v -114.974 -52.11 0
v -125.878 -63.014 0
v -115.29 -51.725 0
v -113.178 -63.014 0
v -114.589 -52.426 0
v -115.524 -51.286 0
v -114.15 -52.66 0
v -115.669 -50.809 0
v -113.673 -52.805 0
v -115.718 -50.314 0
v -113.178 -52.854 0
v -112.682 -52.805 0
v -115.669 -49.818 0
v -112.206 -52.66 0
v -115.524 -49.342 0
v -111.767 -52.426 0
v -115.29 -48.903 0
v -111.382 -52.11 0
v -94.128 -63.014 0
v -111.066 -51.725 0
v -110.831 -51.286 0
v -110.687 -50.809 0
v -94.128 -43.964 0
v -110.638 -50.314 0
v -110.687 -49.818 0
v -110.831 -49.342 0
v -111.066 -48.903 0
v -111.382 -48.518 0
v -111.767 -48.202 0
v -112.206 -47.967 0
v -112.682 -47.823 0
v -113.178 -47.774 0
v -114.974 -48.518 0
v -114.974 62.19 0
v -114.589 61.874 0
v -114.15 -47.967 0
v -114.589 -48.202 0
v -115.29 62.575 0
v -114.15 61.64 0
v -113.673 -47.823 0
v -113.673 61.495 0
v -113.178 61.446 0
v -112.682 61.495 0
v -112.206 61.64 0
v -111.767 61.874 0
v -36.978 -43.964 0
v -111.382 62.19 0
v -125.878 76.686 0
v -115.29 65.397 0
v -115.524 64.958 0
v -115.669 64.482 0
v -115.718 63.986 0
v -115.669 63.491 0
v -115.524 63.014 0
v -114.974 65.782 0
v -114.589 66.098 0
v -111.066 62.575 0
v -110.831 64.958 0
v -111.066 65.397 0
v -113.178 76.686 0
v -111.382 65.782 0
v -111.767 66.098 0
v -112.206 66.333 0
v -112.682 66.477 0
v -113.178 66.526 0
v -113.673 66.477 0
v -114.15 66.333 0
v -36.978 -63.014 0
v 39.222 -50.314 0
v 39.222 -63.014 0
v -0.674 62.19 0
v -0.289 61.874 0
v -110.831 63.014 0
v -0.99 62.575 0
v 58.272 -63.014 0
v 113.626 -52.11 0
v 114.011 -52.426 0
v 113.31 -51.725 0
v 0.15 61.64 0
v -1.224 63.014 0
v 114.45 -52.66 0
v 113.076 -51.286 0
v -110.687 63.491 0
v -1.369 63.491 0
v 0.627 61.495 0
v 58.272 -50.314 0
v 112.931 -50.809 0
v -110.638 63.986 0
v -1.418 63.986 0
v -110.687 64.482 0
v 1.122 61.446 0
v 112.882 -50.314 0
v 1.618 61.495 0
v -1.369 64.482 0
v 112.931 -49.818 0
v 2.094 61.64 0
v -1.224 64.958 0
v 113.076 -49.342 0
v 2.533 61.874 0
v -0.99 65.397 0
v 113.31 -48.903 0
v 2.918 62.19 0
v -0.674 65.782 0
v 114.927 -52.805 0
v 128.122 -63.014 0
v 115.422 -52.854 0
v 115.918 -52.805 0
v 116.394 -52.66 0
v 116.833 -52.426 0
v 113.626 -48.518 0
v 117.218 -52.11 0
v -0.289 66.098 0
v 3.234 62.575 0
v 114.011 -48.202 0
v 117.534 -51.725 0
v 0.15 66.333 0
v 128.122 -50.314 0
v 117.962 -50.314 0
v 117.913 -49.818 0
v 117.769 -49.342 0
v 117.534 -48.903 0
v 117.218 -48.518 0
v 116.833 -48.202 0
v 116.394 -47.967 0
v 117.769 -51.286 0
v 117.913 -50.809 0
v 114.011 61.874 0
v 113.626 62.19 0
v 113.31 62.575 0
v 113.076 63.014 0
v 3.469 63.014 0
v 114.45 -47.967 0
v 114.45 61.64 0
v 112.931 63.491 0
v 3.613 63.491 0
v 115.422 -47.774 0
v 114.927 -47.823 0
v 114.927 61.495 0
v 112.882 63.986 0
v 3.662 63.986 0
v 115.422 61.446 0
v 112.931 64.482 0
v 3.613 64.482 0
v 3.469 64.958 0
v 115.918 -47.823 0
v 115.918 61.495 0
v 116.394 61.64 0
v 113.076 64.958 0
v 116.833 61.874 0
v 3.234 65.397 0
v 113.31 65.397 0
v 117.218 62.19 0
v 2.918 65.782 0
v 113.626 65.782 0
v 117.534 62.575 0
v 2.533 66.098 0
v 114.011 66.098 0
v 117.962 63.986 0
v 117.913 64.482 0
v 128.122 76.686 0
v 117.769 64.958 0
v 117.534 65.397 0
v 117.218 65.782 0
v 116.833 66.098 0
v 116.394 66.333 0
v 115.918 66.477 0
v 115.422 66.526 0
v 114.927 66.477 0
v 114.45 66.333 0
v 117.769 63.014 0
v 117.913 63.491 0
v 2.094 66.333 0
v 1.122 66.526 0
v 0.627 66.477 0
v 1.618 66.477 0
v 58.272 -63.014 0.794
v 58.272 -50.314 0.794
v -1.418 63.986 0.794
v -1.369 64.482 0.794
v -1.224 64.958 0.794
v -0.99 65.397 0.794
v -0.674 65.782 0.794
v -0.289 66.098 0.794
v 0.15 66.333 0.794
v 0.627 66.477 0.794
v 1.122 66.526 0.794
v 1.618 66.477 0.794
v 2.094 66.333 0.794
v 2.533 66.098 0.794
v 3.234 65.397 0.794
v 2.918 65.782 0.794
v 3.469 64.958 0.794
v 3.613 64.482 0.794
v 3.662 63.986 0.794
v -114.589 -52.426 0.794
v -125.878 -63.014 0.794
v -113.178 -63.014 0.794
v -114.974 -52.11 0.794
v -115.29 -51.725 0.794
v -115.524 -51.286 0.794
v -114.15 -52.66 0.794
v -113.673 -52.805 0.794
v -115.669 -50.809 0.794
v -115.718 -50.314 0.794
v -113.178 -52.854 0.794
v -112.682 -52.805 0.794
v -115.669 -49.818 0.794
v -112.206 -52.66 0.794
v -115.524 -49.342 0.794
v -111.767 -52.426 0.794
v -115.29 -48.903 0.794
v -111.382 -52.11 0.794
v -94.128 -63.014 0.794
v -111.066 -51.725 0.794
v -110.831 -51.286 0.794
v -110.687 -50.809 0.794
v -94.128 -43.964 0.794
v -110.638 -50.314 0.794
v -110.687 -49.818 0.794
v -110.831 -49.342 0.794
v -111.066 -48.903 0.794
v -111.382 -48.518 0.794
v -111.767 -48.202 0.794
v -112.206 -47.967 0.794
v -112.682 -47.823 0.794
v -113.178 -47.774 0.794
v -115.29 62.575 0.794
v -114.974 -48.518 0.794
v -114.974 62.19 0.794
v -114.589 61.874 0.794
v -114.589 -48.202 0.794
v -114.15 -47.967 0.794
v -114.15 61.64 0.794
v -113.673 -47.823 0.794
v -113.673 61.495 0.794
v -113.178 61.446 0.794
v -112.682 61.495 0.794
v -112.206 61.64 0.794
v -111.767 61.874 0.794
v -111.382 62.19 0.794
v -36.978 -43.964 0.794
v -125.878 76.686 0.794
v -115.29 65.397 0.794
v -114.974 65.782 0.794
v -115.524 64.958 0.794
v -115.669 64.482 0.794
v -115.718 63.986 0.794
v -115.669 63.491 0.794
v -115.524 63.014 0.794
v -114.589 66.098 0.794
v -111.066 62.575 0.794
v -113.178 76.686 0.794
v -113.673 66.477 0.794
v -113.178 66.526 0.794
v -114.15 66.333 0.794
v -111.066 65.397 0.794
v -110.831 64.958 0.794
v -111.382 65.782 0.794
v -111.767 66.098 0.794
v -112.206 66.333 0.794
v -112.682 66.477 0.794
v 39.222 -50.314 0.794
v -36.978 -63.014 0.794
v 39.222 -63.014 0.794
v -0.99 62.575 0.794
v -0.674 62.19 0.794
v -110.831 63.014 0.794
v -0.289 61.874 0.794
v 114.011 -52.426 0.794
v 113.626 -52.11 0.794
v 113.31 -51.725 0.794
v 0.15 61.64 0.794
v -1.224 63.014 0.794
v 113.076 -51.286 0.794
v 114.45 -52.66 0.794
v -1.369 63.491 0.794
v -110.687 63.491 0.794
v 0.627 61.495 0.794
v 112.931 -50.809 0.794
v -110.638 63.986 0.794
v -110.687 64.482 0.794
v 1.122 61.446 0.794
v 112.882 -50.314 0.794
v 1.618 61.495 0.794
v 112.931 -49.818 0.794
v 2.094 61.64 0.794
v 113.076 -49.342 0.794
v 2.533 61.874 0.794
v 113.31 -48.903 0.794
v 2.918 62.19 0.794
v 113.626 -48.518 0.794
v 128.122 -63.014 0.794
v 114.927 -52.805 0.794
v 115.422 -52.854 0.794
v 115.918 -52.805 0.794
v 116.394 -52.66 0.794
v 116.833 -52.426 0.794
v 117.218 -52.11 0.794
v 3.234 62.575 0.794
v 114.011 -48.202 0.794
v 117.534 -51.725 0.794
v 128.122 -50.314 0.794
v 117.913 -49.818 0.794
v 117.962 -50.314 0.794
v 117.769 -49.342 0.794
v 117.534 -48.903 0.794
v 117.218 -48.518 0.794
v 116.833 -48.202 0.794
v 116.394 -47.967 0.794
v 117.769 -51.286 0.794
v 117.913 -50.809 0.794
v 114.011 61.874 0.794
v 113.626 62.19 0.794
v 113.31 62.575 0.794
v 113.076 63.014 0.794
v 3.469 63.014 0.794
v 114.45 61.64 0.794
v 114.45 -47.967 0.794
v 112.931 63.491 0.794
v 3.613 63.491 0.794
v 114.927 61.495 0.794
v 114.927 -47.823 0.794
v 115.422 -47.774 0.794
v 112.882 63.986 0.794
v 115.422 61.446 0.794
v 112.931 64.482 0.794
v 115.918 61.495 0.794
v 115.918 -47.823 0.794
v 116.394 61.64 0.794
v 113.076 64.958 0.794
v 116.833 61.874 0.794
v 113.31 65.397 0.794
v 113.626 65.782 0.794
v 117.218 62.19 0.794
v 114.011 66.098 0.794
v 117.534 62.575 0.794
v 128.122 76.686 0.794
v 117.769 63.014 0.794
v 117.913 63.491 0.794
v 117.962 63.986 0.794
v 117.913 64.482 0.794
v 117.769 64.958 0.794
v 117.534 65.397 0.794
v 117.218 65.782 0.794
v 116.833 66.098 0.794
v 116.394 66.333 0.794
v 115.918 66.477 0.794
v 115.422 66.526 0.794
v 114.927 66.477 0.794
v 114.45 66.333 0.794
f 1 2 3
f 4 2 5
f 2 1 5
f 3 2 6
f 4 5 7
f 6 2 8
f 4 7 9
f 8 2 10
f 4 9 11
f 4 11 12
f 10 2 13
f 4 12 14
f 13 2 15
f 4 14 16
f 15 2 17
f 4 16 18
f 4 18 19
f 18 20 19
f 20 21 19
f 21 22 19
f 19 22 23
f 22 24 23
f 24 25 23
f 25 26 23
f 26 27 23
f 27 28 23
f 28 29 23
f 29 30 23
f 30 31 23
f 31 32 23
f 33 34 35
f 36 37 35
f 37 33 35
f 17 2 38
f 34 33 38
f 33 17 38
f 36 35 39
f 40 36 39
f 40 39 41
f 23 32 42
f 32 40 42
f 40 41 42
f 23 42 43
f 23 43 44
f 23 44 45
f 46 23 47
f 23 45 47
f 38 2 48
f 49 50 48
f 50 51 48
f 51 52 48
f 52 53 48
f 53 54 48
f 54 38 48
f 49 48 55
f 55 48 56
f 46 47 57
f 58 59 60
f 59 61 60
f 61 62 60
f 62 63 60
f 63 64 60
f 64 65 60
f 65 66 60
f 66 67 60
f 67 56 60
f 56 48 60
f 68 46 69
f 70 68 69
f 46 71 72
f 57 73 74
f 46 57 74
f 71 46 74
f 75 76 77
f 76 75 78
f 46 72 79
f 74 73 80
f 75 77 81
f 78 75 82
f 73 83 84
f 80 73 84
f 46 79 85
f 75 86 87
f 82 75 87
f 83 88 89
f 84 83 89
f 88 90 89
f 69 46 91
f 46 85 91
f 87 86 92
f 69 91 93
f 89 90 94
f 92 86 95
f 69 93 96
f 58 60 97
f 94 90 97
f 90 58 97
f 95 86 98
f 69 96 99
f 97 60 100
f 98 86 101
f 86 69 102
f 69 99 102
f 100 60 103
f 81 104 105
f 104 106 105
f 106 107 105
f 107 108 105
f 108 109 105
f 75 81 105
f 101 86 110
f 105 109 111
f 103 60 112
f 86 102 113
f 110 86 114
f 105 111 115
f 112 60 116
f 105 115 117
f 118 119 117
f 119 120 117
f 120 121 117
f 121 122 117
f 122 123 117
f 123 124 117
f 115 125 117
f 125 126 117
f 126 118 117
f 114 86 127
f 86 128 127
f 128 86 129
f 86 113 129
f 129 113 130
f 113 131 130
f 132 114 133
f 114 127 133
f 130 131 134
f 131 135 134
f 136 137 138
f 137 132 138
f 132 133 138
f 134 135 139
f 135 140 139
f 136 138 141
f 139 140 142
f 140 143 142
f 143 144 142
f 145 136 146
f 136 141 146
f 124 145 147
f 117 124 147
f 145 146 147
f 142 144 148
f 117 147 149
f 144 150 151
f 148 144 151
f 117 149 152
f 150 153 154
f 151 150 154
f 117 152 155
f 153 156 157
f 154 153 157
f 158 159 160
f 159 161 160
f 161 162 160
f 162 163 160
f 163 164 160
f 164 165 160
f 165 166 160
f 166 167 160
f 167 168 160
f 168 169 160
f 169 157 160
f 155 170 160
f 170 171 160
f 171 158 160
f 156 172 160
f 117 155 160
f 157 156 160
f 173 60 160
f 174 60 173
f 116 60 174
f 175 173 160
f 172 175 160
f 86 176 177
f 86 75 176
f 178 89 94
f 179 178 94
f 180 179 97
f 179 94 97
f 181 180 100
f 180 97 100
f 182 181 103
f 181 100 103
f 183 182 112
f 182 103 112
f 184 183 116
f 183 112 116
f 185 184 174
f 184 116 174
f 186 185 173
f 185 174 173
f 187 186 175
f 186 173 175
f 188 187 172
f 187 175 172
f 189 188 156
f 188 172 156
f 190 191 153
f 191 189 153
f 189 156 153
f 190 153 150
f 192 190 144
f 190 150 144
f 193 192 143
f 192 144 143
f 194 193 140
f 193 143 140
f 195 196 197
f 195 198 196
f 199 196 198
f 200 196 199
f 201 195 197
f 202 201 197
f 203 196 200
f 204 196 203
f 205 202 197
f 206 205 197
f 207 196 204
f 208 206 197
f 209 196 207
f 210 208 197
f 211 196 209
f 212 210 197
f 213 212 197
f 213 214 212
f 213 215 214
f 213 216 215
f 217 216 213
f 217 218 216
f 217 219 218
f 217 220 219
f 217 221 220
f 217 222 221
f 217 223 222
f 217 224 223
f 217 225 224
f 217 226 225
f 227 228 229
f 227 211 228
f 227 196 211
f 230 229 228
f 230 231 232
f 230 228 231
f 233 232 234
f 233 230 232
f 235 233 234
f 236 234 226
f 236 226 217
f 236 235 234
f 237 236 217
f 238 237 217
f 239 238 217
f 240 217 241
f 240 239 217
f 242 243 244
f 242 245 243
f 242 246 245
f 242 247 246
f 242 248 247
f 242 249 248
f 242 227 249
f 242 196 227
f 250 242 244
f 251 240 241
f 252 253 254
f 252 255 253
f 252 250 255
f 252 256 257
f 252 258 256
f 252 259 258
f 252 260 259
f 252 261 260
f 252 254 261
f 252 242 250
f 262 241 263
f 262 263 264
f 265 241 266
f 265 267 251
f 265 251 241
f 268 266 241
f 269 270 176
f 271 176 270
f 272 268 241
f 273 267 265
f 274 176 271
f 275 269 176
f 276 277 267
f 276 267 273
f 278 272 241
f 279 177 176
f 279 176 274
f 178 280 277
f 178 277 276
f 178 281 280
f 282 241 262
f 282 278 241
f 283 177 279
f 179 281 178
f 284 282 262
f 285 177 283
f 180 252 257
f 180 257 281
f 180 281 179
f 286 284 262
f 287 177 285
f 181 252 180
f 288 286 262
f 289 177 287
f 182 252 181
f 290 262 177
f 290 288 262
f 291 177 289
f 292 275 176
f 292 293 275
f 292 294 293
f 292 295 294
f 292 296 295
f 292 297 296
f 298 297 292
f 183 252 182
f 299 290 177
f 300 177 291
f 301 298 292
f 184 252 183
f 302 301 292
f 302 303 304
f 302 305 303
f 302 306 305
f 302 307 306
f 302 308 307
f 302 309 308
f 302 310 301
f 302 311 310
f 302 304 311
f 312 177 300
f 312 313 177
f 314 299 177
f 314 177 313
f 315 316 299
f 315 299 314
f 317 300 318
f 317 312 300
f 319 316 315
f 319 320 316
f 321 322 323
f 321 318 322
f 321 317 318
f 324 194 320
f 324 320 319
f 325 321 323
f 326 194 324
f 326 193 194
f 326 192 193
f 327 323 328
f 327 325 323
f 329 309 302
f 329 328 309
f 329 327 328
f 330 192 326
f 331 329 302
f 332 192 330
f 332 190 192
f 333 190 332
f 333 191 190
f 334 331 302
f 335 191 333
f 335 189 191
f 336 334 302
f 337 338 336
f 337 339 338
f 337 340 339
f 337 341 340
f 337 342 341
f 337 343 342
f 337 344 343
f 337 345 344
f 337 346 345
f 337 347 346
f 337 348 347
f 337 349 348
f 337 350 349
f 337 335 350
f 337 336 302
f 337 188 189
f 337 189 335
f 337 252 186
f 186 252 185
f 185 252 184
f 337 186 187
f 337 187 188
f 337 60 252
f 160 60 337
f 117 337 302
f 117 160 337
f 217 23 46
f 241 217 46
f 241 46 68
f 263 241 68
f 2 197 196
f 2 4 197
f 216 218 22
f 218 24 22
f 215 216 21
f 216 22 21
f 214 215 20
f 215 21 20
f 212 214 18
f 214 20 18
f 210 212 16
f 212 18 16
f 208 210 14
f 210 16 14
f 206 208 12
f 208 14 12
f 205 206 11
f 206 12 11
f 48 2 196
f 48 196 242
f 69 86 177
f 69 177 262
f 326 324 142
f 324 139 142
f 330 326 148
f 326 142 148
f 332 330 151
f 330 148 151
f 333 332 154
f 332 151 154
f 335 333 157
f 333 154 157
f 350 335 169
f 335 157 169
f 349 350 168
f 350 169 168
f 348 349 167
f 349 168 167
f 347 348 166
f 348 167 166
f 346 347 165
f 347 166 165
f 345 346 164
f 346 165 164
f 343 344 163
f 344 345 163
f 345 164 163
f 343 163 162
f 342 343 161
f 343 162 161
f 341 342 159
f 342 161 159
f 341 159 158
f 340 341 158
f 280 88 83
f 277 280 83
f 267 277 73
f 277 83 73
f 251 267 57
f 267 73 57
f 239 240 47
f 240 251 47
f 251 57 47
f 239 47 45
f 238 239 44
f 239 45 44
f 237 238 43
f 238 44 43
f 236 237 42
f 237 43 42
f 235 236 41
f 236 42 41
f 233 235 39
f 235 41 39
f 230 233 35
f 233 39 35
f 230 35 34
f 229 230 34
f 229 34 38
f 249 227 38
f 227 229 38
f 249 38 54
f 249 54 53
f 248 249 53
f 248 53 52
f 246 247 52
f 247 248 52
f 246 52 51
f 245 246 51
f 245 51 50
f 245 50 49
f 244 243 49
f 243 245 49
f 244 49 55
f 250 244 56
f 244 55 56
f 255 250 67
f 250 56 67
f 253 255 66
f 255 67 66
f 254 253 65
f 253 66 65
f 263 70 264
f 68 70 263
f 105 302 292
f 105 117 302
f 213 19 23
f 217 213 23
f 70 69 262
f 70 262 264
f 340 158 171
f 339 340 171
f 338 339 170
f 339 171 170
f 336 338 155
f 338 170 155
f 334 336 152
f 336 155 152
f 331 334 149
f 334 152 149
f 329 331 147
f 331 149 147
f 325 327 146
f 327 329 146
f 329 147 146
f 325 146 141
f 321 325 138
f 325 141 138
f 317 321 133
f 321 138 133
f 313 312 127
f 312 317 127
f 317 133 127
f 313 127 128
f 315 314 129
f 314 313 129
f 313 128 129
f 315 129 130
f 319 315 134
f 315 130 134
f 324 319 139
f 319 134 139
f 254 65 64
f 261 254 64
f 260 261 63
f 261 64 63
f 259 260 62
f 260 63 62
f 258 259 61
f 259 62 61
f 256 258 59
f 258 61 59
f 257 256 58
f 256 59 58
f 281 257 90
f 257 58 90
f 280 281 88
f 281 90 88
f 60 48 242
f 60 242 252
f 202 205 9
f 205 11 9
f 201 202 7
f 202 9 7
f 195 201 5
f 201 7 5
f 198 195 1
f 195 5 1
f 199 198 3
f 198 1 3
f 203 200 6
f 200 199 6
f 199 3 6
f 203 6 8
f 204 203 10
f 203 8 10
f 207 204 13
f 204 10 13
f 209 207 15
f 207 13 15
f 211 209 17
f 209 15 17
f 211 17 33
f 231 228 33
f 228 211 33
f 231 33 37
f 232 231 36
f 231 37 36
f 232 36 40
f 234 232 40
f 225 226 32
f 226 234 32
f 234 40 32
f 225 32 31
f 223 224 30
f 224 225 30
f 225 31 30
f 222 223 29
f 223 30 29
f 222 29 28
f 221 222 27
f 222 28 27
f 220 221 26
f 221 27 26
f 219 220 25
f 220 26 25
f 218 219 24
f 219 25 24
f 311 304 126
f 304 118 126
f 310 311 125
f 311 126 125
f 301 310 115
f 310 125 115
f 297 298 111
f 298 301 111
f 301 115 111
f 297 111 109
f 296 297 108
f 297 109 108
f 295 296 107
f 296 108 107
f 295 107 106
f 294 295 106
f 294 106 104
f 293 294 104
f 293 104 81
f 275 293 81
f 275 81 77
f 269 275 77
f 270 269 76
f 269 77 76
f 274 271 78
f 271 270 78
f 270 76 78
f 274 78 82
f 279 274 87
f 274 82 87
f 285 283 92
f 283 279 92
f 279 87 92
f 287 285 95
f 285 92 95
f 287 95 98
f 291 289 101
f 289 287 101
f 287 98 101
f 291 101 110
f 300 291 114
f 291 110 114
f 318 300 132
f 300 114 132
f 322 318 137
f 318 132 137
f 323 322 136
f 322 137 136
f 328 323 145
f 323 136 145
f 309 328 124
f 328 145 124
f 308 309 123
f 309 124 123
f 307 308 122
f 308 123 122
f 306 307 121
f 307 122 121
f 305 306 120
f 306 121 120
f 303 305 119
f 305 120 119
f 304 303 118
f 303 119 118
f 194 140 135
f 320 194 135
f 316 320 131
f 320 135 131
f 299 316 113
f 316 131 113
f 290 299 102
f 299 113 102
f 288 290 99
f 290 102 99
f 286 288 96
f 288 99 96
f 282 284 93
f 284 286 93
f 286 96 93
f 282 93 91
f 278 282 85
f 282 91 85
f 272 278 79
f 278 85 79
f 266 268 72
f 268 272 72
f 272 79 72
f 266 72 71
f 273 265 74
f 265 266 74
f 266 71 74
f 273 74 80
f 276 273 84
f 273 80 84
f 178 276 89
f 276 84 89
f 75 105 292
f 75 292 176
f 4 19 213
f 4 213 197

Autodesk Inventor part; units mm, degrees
ref_plane "YZ Plane" through (0, 0, 0) normal (1, 0, 0) x (0, 1, 0)
ref_plane "XZ Plane" through (0, 0, 0) normal (0, 1, 0) x (-1, 0, 0)
ref_plane "XY Plane" through (0, 0, 0) normal (0, 0, 1) x (1, 0, 0)
sketch "Sketch1" plane through (0, 0, 0) normal (0, 0, 1) x (1, 0, 0)
  line L0 (-125.8778, 76.6863) -> (128.1222, 76.6863)
  line L1 (128.1222, 76.6863) -> (128.1222, -63.0137)
  line L2 (128.1222, -63.0137) -> (-125.8778, -63.0137)
  line L3 (-125.8778, -63.0137) -> (-125.8778, 76.6863)
  line L4 (-125.8778, -63.0137) -> (-94.1278, -63.0137)
  line L5 (-94.1278, -63.0137) -> (-94.1278, -43.9637)
  line L6 (-94.1278, -43.9637) -> (-36.9778, -43.9637)
  line L7 (-36.9778, -43.9637) -> (-36.9778, -63.0137)
  line L8 (128.1222, -63.0137) -> (58.2722, -63.0137)
  line L9 (58.2722, -63.0137) -> (58.2722, -50.3137)
  line L10 (58.2722, -50.3137) -> (39.2222, -50.3137)
  line L11 (39.2222, -50.3137) -> (39.2222, -63.0137)
  line L12 (-125.8778, 76.6863) -> (-113.1778, 76.6863)
  line L13 (-113.1778, 76.6863) -> (-113.1778, 63.9863)
  circle A0 centre (-113.1778, 63.9863) radius 2.54
  line L14 (-113.1778, 63.9863) -> (1.1222, 63.9863)
  circle A1 centre (1.1222, 63.9863) radius 2.54
  line L15 (1.1222, 63.9863) -> (115.4222, 63.9863)
  circle A2 centre (115.4222, 63.9863) radius 2.54
  line L16 (-125.8778, -63.0137) -> (-113.1778, -63.0137)
  line L17 (-113.1778, -63.0137) -> (-113.1778, -50.3137)
  circle A3 centre (-113.1778, -50.3137) radius 2.54
  line L18 (128.1222, -63.0137) -> (128.1222, -50.3137)
  line L19 (128.1222, -50.3137) -> (115.4222, -50.3137)
  circle A4 centre (115.4222, -50.3137) radius 2.54
  point P0 (0, 0)
  dimension "d0" = 254
  dimension "d1" = 139.7
  dimension "d6" = 31.75
  dimension "d7" = 19.05
  dimension "d8" = 57.15
  dimension "d9" = 69.85
  dimension "d10" = 12.7
  dimension "d11" = 19.05
  dimension "d14" = 12.7
  dimension "d15" = 12.7
  dimension "d16" = 5.08
  dimension "d17" = 114.3
  dimension "d18" = 5.08
  dimension "d19" = 114.3
  dimension "d20" = 5.08
  dimension "d21" = 12.7
  dimension "d22" = 12.7
  dimension "d23" = 5.08
  dimension "d24" = 12.7
  dimension "d25" = 12.7
  dimension "d26" = 5.08
extrude "Extrusion4" add sketch "Sketch1" along normal blind 0.7937 contours L0 L1 L2 L9 L10 L11 L7 L6 L5 L3
properties part number "Top Intake Poly (Sponsor Panel)"
